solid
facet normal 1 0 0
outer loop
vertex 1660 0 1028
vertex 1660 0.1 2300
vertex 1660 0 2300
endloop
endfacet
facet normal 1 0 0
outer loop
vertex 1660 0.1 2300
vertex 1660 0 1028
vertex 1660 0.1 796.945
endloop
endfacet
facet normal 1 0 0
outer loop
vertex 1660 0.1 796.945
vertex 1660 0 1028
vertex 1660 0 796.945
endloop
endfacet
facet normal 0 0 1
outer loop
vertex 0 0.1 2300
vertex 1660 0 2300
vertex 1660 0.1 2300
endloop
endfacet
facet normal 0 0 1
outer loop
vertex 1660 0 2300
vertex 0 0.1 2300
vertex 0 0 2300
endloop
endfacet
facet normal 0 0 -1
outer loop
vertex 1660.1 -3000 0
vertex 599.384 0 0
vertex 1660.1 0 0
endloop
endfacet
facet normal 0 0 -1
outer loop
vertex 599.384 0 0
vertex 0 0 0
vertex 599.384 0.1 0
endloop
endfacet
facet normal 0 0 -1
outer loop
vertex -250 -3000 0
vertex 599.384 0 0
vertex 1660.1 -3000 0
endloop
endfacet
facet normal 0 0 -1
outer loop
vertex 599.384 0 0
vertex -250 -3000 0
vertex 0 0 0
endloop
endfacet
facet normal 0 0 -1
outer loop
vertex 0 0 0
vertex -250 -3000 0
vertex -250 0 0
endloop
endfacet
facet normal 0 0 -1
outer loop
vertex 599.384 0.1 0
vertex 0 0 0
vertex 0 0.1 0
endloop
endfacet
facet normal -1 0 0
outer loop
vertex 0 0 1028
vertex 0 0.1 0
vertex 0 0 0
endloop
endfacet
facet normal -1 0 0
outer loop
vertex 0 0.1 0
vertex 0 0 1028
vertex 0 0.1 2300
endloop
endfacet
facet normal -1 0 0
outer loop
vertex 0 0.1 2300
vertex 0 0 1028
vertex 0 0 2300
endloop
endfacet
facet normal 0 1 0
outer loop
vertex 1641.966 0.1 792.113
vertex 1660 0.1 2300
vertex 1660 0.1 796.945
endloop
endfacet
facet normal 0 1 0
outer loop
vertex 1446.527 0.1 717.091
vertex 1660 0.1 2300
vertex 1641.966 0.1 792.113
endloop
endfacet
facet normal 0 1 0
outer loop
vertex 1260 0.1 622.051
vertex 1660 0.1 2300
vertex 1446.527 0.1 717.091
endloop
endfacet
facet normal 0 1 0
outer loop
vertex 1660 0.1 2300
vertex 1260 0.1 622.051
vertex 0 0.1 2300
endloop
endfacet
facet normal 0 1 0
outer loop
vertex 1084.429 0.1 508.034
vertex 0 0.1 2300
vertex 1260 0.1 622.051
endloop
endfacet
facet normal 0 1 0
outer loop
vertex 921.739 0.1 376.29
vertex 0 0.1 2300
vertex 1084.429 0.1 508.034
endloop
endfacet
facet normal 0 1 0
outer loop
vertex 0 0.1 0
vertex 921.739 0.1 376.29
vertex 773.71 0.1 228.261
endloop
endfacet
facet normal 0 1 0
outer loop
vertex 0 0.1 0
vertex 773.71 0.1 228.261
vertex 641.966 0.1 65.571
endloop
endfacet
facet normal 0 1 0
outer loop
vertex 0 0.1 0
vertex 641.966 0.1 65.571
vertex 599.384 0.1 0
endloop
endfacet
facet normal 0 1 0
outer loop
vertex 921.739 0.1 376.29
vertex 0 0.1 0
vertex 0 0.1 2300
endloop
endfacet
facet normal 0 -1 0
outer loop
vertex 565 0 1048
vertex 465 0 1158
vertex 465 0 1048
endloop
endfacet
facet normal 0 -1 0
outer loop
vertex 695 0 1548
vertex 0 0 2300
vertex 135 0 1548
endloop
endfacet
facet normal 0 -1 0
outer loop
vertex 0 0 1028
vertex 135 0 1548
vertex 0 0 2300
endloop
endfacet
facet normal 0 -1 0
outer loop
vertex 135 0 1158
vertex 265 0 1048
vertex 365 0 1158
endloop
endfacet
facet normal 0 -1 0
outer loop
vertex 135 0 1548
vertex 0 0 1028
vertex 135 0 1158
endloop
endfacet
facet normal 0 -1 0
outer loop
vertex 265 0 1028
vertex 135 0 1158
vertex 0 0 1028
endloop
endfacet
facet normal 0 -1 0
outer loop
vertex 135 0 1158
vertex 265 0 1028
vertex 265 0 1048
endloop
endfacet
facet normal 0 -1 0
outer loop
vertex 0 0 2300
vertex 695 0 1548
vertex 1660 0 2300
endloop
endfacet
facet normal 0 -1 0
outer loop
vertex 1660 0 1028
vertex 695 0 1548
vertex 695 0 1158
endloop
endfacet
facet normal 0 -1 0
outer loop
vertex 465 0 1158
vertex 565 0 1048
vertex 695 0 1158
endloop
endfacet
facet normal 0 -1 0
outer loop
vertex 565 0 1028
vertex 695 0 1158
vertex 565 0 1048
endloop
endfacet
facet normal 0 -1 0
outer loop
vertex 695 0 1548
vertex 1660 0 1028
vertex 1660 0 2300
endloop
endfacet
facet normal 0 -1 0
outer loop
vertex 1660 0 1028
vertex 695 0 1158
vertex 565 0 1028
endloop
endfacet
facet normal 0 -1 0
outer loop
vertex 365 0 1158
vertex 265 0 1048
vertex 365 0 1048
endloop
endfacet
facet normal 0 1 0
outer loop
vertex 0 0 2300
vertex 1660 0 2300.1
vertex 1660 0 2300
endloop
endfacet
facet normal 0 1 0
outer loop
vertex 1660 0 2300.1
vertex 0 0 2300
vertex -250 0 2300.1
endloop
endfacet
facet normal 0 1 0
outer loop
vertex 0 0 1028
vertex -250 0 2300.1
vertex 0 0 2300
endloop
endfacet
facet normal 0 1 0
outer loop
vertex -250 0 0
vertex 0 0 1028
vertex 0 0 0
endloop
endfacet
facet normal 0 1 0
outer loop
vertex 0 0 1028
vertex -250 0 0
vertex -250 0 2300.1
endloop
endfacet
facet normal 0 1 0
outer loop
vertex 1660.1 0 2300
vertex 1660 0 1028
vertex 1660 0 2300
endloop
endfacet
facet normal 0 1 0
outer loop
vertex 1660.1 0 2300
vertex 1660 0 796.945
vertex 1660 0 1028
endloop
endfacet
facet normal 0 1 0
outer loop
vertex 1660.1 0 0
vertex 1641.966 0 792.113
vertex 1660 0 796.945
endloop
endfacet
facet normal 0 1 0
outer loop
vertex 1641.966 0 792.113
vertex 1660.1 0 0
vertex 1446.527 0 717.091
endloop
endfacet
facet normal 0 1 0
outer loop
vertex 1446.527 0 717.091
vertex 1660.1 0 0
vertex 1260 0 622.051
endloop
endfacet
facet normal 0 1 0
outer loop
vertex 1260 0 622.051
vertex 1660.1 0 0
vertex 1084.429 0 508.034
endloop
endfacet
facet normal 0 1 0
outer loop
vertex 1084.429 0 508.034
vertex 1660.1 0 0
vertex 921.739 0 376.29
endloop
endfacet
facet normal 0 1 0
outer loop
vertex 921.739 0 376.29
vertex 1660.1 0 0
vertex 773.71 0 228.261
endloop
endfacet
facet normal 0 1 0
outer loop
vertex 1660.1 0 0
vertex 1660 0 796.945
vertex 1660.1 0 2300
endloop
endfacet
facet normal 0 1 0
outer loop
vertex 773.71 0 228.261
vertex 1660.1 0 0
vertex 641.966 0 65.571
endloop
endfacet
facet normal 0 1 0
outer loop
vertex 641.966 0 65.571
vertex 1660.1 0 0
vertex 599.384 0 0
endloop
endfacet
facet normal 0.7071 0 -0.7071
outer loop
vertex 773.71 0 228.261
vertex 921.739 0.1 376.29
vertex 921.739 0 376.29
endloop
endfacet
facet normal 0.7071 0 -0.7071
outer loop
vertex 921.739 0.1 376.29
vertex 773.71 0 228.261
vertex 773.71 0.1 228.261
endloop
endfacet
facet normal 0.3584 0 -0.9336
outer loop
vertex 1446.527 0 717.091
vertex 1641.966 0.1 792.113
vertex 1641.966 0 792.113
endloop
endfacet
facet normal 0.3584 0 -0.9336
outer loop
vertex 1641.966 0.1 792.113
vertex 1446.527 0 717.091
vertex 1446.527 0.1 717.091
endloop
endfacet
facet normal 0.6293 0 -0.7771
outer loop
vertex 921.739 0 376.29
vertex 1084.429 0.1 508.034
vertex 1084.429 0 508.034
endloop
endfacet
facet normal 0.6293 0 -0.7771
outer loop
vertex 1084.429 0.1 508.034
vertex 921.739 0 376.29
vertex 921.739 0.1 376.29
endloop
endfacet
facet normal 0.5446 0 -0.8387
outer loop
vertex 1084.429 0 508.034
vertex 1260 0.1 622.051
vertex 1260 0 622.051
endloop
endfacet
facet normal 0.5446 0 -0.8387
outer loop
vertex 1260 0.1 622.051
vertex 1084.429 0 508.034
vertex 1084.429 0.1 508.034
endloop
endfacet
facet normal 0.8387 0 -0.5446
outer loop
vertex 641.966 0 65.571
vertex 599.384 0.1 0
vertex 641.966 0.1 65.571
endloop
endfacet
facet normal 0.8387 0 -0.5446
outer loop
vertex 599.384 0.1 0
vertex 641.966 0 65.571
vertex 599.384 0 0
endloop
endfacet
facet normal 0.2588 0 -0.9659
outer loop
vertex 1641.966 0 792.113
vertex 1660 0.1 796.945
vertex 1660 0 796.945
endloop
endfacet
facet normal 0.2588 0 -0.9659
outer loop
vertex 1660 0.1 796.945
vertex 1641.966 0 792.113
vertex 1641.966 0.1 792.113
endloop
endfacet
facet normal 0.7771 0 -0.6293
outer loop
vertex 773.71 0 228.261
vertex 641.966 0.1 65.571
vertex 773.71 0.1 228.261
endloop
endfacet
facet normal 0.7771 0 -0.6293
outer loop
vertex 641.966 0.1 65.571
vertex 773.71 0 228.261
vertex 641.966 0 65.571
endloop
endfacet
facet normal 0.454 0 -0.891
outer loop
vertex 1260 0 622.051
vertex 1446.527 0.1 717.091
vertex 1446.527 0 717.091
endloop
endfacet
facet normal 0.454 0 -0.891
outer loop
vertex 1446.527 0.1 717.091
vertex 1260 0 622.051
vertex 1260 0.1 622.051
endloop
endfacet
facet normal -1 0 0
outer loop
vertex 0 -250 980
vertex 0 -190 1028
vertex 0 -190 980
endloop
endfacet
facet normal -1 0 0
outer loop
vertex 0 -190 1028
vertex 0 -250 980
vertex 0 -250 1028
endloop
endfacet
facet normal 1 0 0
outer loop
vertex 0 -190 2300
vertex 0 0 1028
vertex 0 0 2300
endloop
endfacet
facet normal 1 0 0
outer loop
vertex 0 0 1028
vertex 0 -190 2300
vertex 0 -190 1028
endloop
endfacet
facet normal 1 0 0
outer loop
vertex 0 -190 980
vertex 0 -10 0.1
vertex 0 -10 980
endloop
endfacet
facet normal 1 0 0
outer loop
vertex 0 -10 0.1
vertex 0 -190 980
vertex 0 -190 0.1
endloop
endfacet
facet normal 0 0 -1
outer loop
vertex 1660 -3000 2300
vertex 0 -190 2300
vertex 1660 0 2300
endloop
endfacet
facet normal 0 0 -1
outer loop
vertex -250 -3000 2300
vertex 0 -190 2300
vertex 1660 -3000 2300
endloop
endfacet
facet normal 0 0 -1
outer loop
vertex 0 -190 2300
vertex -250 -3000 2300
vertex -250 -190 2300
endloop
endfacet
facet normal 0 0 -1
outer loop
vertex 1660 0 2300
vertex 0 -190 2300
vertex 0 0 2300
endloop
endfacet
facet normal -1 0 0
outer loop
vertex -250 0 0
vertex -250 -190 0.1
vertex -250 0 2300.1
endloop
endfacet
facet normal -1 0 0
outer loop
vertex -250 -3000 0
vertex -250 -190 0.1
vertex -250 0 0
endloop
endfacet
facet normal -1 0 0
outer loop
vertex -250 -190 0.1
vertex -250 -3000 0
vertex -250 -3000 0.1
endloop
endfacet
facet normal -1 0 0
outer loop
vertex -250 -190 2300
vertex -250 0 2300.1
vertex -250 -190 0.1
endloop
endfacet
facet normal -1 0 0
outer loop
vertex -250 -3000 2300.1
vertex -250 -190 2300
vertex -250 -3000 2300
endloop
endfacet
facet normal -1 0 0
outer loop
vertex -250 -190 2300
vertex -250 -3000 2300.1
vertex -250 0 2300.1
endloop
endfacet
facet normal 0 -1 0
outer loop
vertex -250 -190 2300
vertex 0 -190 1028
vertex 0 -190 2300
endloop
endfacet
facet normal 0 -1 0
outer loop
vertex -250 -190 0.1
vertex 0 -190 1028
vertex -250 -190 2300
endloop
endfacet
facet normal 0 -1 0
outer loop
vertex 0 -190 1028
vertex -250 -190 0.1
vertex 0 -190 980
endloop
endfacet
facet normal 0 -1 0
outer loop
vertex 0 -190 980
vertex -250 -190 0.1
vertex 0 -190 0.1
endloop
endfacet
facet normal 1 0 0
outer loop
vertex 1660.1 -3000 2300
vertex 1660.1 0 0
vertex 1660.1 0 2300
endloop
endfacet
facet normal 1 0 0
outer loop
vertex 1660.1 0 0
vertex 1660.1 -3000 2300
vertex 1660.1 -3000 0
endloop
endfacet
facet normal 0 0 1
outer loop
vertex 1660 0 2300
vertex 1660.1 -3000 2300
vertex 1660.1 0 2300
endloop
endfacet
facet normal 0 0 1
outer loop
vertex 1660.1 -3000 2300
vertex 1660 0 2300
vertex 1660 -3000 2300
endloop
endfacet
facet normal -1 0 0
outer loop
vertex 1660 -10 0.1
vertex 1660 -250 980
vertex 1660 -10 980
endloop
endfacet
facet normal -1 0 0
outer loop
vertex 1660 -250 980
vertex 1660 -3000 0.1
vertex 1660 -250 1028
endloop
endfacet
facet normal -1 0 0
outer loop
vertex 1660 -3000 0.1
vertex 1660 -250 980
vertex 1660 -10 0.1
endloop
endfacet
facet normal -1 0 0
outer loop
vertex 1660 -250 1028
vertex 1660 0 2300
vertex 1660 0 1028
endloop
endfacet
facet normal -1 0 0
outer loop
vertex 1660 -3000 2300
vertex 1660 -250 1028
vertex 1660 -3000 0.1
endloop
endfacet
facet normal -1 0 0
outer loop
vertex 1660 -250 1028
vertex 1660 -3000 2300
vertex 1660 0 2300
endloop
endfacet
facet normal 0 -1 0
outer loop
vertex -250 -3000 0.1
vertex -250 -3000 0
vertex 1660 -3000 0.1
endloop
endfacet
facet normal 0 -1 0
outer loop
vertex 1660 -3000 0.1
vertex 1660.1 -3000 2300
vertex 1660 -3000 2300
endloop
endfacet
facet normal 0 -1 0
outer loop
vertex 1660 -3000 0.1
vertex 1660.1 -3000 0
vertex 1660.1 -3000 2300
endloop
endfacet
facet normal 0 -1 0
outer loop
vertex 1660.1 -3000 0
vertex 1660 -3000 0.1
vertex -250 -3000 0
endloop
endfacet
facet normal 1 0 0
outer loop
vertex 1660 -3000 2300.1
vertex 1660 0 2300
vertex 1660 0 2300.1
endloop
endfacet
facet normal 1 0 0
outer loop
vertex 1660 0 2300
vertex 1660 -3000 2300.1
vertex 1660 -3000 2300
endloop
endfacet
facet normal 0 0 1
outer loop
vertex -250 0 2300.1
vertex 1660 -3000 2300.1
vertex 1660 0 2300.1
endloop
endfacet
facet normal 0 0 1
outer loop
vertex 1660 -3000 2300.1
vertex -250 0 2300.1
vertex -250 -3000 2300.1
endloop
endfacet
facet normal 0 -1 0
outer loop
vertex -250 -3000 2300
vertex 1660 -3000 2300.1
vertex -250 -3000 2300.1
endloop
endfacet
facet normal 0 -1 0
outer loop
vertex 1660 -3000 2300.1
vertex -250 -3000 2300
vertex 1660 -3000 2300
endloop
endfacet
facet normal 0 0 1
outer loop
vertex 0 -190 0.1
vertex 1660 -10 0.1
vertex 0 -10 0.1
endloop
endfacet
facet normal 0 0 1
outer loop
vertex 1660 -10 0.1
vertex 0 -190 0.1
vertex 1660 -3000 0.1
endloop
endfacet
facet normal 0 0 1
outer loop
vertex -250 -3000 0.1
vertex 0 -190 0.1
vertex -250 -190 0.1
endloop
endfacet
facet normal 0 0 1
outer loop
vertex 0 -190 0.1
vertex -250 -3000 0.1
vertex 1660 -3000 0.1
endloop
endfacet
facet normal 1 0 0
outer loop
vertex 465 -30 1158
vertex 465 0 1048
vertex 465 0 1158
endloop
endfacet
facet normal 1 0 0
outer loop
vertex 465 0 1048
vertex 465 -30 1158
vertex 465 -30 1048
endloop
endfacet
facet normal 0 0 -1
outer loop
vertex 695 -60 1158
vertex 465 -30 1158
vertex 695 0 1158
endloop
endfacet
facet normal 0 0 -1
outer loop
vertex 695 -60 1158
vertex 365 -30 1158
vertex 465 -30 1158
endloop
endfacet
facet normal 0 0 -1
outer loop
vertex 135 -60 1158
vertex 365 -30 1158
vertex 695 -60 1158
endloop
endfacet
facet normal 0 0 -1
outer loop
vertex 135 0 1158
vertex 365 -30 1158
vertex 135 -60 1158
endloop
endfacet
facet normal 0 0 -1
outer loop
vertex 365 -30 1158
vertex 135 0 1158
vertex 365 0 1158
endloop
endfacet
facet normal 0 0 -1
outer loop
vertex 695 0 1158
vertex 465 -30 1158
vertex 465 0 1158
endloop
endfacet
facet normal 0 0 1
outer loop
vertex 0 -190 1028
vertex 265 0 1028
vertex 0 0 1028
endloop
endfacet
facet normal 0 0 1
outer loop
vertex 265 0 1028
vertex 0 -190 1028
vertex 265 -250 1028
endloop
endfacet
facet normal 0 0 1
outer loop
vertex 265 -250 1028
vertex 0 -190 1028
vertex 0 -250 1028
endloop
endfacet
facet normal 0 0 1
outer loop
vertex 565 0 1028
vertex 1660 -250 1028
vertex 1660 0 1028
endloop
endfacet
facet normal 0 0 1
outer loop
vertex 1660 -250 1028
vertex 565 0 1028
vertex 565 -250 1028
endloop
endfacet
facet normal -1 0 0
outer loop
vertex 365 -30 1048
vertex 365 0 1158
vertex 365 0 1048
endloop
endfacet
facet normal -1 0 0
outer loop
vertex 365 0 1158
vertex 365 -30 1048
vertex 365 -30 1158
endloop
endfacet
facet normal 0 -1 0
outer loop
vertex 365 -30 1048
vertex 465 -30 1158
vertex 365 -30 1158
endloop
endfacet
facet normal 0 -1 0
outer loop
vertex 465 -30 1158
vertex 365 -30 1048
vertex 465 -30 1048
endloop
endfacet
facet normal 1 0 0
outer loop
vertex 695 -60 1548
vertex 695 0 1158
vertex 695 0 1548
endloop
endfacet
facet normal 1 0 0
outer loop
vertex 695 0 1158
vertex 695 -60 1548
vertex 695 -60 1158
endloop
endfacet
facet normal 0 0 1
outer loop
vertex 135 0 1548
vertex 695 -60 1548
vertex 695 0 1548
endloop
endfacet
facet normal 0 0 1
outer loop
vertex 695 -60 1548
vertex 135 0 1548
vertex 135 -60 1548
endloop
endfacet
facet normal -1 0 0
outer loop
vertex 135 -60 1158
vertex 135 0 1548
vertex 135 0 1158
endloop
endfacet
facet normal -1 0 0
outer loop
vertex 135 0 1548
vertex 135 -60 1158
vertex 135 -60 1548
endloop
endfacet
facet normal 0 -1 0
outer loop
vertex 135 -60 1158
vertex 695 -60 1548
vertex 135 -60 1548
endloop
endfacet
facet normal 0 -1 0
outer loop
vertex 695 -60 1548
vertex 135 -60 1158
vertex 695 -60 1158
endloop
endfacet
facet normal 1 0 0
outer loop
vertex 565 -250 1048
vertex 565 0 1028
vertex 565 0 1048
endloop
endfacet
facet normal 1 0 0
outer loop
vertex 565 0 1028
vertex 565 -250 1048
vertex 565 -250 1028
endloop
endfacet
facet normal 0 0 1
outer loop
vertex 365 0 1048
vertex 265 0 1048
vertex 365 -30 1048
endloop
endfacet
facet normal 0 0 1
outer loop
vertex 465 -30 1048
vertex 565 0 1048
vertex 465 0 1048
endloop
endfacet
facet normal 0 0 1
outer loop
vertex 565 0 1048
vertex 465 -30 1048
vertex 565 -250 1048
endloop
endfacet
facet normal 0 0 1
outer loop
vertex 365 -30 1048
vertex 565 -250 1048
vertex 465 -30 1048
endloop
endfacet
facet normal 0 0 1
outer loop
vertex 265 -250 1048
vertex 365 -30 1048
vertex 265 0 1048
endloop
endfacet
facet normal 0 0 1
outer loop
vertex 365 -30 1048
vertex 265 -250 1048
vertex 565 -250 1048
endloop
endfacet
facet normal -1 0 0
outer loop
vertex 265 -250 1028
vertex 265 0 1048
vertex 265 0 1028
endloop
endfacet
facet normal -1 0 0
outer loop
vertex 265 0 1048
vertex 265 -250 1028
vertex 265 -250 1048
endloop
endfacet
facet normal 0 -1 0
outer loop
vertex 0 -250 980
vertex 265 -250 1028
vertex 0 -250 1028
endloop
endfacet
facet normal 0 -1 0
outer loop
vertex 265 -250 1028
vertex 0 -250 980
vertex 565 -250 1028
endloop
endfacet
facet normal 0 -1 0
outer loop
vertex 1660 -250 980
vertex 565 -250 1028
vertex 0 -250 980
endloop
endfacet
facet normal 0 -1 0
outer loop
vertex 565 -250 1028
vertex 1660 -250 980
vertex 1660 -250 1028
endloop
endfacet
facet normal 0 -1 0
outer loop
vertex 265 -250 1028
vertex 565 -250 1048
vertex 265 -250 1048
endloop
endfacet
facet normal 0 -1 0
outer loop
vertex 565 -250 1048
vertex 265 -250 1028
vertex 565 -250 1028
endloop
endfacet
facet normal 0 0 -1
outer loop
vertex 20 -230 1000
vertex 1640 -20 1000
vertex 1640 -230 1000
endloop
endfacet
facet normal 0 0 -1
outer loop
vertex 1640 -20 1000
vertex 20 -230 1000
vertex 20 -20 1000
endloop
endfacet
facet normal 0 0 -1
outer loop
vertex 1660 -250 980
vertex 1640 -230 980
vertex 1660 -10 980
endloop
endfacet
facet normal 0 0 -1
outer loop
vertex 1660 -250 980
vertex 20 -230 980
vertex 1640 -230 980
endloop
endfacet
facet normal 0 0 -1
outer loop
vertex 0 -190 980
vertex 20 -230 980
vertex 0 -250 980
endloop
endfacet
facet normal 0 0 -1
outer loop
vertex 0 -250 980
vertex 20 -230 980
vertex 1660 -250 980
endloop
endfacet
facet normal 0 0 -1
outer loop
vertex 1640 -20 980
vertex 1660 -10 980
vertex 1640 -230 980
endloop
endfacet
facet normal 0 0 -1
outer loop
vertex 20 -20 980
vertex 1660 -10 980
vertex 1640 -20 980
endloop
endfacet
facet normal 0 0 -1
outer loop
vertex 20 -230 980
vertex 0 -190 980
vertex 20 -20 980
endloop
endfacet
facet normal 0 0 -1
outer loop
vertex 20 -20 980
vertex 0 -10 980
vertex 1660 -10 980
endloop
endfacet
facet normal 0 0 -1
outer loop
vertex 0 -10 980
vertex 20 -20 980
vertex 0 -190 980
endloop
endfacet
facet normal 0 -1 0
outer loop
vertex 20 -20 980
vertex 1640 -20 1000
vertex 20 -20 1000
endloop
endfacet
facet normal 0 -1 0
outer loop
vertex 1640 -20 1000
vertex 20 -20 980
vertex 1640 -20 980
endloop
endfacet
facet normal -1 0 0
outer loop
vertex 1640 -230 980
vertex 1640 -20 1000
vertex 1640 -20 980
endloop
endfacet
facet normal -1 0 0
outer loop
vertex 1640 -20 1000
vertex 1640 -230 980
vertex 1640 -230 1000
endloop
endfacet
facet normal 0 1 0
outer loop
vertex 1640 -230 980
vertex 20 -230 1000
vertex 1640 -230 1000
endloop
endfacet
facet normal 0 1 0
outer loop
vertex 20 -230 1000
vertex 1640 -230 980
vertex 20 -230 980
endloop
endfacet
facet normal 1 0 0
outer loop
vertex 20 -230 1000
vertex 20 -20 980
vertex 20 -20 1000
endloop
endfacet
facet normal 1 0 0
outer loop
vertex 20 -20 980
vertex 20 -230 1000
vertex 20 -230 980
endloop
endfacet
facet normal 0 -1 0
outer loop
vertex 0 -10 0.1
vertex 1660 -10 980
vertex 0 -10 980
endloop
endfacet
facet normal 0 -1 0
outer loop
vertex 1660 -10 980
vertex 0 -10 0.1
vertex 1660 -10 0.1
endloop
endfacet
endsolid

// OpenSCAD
/*
 * Shelf in fitness basement
 */


ROOM_HEIGHT  = 2300;
WALL_WIDTH   = 1660;
PILLAR_DEPTH =  190;
PILLAR_WIDTH =  250;
DEPTH        = 3000;

module pillar() {
    translate([-PILLAR_WIDTH, -PILLAR_DEPTH, 0])
    cube([PILLAR_WIDTH, PILLAR_DEPTH, ROOM_HEIGHT]);
}

module back_wall() {
    difference() {
        cube([WALL_WIDTH, .1, ROOM_HEIGHT]);

        r = 2000;
        translate([WALL_WIDTH+r -1400, 0, -r+90 + 800])
        rotate([90, 0, 0]) 
        cylinder(r=r, h=30, center=true, $fn=60);
    }
}

module side_wall() {
    translate([WALL_WIDTH, -DEPTH, 0])
    cube([.1, DEPTH, ROOM_HEIGHT]);
}

module ceiling() {
    translate([-PILLAR_WIDTH, -DEPTH, ROOM_HEIGHT])
    cube([PILLAR_WIDTH+WALL_WIDTH, DEPTH, .1]);
}

module floor() {
    translate([-PILLAR_WIDTH, -DEPTH, 0])
    cube([PILLAR_WIDTH+WALL_WIDTH, DEPTH, .1]);
}

module room() {
    color("#ccc") {
        pillar();
        back_wall();
        side_wall();
        ceiling();
        floor();
    }
}

module computer() {
    translate([-560/2, -60, 0])
    color("black") {
        translate([560/2-100/2, 60-30, 0]) cube([100, 30, 130]);
        translate([0, 0, 130]) cube([560, 60, 390]);
        translate([560/2-300/2, -250 +60, 0])
        cube([300, 250, 20]);
    }
}


SHELF_LENGTH     = 1660;
SHELF_WIDTH      =  250;
SHELF_THICKNESS  =   28;
SHELF_ALTITUDE   = 1000;

SHELF_THICKNESS2 =   18;
SHELF_WIDTH2     =  150;

SHELF_BACK_THICKNESS = 10;
SHELF_SUPPORT_THICKNESS = 20;

module shelf_top() {
    color("orange")
    cube([SHELF_LENGTH, SHELF_WIDTH, SHELF_THICKNESS]);
}

module shelf_base() {
    color("orange")
    cube([SHELF_LENGTH, SHELF_WIDTH2, SHELF_THICKNESS2]);
}

module shelf_center() {
    color("orange")
    cube([SHELF_THICKNESS2,
          SHELF_WIDTH2,
          SHELF_ALTITUDE-SHELF_THICKNESS2]);
}

BACK_COLOR = [1, 1, 1, .8];

module shelf_back_narrow() {
    width  = WALL_WIDTH/2;
    height = SHELF_ALTITUDE;
    thickness = SHELF_BACK_THICKNESS;
    echo(str("Back plate: ", width, " x ", height, " x ", thickness));
    color(BACK_COLOR)
    cube([width-2, thickness, height]);
}

module shelf_back() {
    width  = WALL_WIDTH;
    height = SHELF_ALTITUDE - SHELF_SUPPORT_THICKNESS;
    thickness = SHELF_BACK_THICKNESS;
    echo(str("Back plate: ", width, "(TBC) x ", height, " x ", thickness));

    color(BACK_COLOR)
    cube([width, thickness, height]);
}

module shelf_supports() {
    color("orange") {
        cube([WALL_WIDTH, SHELF_SUPPORT_THICKNESS, SHELF_SUPPORT_THICKNESS]);

        translate([WALL_WIDTH-SHELF_SUPPORT_THICKNESS, -SHELF_WIDTH + SHELF_SUPPORT_THICKNESS, 0])
        cube([SHELF_SUPPORT_THICKNESS, SHELF_WIDTH, SHELF_SUPPORT_THICKNESS]);

        translate([0, -SHELF_WIDTH + SHELF_SUPPORT_THICKNESS, 0])
        cube([WALL_WIDTH, SHELF_SUPPORT_THICKNESS, SHELF_SUPPORT_THICKNESS]);

        translate([0, -SHELF_WIDTH + SHELF_SUPPORT_THICKNESS, 0])
        cube([SHELF_SUPPORT_THICKNESS, SHELF_WIDTH, SHELF_SUPPORT_THICKNESS]);

    }
}
////////////////////////////////////////////////////////////////////////////////

room();

translate([WALL_WIDTH*.25, 0, SHELF_ALTITUDE + SHELF_THICKNESS]) computer();

translate([0, -SHELF_WIDTH, SHELF_ALTITUDE]) shelf_top();

if (0) {
    translate([0, -SHELF_BACK_THICKNESS, 0]) shelf_back_narrow();
    translate([WALL_WIDTH/2+1, -SHELF_BACK_THICKNESS, 0]) shelf_back_narrow();
} else {
    translate([0, -SHELF_BACK_THICKNESS, 0]) shelf_back();
}

translate([0, -SHELF_SUPPORT_THICKNESS, SHELF_ALTITUDE-SHELF_SUPPORT_THICKNESS])
shelf_supports();
